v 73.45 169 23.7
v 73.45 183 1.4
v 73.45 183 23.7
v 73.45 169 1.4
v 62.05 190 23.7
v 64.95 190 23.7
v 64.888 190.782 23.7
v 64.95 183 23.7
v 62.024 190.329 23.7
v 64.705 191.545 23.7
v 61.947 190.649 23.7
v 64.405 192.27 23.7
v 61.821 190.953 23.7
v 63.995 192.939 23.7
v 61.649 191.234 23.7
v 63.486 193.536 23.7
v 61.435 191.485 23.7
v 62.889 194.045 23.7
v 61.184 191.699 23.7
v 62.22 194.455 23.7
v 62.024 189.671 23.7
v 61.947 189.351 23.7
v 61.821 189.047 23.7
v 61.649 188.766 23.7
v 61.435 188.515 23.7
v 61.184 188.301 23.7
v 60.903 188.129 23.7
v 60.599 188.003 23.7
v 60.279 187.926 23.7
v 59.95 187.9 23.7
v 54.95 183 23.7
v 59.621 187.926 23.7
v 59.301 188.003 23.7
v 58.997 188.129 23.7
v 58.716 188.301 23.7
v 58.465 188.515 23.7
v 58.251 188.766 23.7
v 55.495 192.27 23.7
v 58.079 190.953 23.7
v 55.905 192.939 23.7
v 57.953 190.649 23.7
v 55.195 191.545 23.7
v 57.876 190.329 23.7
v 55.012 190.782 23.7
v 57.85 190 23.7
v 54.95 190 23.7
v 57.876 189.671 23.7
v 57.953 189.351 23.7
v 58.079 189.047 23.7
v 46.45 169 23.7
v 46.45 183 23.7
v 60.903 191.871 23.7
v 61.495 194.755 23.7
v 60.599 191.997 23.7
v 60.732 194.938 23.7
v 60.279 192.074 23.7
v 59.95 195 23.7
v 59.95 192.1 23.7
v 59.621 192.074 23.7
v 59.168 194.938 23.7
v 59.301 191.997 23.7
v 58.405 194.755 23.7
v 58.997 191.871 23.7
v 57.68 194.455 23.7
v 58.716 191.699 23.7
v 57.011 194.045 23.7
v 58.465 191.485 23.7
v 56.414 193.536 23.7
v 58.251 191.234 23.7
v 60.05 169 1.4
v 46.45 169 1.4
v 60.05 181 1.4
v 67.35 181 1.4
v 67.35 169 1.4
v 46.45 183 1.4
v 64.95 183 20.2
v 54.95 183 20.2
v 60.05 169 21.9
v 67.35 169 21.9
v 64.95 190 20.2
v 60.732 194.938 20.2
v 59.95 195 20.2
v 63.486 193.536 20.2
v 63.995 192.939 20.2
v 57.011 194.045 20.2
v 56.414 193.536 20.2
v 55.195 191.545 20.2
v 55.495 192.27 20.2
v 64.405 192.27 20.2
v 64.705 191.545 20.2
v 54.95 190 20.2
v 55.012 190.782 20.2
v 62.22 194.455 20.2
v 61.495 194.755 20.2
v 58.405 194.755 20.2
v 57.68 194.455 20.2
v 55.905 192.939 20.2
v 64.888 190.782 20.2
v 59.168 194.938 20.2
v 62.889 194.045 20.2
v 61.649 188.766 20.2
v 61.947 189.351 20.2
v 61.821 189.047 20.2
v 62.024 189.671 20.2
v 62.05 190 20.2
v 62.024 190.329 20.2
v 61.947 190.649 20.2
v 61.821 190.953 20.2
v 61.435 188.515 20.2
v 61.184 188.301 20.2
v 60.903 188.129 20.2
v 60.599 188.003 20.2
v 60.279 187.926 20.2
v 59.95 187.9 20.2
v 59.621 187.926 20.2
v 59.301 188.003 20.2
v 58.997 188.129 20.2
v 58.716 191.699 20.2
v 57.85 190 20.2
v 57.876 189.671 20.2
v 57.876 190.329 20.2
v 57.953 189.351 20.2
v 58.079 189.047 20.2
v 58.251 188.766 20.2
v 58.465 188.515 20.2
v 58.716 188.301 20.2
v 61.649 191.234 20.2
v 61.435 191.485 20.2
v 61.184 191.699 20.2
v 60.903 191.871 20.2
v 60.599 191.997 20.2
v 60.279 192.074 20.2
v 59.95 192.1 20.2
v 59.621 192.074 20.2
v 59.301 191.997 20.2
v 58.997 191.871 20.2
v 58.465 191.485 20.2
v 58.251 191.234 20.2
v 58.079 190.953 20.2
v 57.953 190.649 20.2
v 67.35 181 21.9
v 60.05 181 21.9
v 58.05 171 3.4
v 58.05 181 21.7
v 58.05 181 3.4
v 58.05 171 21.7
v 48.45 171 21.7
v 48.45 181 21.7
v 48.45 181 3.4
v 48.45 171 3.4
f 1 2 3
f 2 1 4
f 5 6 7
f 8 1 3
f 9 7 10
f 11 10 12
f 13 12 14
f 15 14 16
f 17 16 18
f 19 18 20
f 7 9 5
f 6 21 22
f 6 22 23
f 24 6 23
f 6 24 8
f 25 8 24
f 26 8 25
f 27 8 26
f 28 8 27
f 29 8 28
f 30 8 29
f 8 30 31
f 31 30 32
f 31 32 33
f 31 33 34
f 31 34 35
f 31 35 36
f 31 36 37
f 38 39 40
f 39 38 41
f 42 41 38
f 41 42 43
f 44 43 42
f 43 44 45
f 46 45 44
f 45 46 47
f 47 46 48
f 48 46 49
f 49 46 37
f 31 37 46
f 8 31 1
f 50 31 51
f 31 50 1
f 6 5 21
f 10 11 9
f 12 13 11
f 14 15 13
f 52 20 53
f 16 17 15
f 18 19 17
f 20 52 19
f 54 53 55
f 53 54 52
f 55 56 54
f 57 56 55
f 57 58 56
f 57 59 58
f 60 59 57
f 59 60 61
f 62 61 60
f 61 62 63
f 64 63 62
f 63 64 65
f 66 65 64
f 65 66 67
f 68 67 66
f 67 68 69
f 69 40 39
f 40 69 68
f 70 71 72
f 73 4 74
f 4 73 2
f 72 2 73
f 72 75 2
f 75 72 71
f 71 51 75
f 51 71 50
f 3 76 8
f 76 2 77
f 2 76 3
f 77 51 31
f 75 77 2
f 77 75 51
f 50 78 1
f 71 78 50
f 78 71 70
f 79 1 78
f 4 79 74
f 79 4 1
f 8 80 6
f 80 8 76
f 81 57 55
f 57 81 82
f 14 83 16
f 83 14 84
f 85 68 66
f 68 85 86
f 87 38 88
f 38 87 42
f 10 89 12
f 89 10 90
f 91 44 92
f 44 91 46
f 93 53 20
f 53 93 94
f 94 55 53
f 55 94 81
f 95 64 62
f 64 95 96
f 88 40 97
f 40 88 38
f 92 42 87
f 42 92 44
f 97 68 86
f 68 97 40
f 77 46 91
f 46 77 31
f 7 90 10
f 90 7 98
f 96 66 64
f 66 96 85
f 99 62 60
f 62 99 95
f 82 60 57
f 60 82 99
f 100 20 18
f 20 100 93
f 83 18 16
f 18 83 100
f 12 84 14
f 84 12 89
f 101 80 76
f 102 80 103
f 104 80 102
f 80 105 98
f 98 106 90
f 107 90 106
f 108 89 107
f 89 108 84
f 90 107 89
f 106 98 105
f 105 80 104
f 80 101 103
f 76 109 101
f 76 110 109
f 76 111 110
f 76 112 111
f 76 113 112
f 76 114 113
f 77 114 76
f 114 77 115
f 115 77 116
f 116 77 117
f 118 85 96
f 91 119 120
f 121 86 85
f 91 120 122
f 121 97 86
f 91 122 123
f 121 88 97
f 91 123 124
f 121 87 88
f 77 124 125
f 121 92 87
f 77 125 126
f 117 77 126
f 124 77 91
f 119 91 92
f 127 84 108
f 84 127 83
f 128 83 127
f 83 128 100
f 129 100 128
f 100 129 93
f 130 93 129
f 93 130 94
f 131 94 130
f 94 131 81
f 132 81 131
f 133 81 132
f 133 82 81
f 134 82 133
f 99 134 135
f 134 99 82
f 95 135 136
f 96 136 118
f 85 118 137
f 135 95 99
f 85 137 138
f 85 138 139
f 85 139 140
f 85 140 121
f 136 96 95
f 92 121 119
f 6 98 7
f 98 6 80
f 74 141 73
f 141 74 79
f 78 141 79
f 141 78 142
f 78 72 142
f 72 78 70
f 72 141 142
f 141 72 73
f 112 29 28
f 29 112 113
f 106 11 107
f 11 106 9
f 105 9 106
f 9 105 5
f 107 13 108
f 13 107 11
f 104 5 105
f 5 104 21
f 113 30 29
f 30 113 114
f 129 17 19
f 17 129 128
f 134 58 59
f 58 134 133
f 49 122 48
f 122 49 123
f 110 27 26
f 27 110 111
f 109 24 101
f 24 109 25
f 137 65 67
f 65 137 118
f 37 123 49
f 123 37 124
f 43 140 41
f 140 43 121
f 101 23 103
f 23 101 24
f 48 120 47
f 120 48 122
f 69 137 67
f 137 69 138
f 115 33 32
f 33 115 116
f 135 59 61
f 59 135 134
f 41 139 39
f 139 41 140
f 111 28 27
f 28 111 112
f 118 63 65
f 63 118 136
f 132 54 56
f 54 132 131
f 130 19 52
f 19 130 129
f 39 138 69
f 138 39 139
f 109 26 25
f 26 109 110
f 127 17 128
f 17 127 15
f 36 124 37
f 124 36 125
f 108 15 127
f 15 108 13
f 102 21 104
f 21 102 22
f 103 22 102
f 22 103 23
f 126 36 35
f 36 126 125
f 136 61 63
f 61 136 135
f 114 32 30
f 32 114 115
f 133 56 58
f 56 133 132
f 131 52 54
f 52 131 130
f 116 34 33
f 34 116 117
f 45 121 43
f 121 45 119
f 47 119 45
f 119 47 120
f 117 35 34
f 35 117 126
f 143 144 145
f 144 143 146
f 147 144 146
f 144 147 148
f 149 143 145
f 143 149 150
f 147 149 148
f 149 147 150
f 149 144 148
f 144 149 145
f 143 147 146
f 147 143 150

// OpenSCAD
// file: common.scad
// Pi Flux r1 - reverse-engineered shared parameters
// Coordinates: x = left->right as seen from the FRONT, y = top->bottom
// (top edge = pull-switch side), z = 0 at the back surface, up towards the screen.
// Use at(x,y) to place things in these "drawing" coordinates.

$fn = 40;

// ---------------- overall ----------------
W        = 150;     // outer width
L        = 183;     // outer height
CH       = 9;       // corner chamfer
WALL     = 3;       // side wall thickness
FLOOR    = 2;       // back plate thickness
H_BOT    = 24;      // bottom shell height (split plane)
H_FACE   = 10.5;    // face part height
T        = H_BOT + H_FACE; // total thickness
PLATE    = 2;       // face plate thickness
TOL      = 0.25;

// ---------------- screws ----------------
M25_CLR  = 2.8;     // clearance hole
M25_PIL  = 2.2;     // pilot hole for self tapping into plastic (use 3.6 for brass insert)
M25_HEAD = 5.2;     // counterbore for head
BOSS_D   = 7;
// 6 case screws: 4 corners + 2 on the screen/keyboard divider
CASE_SCREWS = [[8.5,8.5],[W-8.5,8.5],[6.5,90],[W-6.5,90],[8.5,L-8.5],[W-8.5,L-8.5]];

// ---------------- display (Waveshare 5-DSI-TOUCH-A) ----------------
DISP_W = 129; DISP_H = 72.8; DISP_T = 7.8; DISP_R = 4; DISP_POST = 5;
DISP_X = (W-DISP_W)/2;  // left edge of glass
DISP_Y = 13;            // top edge of glass
DISP_Z_FRONT = T - PLATE;
DISP_Z_BACK  = DISP_Z_FRONT - DISP_T;
DISP_POST_END = DISP_Z_BACK - DISP_POST;   // where the display's own standoffs end
// outer 117 x 61 M2.5 pattern (6 / 5.9 mm from glass edges)
DISP_HOLES = [for (dx=[6, 6+117]) for (dy=[5.9, 5.9+61]) [DISP_X+dx, DISP_Y+dy]];

// ---------------- Raspberry Pi 5 (mounted on the display back) -----
// inner 58 x 49 pattern; ports point to the RIGHT wall, USB-C edge to the TOP
PI_HOLES_X = [DISP_X+45.5, DISP_X+45.5+58];
PI_HOLES_Y = [DISP_Y+11.9, DISP_Y+11.9+49];
PI_X0 = PI_HOLES_X[0]-3.5;          // non-port end of the board
PI_Y0 = PI_HOLES_Y[0]-3.5;          // USB-C / HDMI edge
PI_PCB_TOP = DISP_POST_END;         // pcb face against the posts
PI_PCB_BOT = PI_PCB_TOP - 1.6;      // component side faces the back plate
PI_USBC_X  = PI_X0 + 11.2;
PI_USBC_Z  = PI_PCB_BOT - 1.6;
// right-edge ports (centre measured from the USB-C edge, width, height)
PI_PORTS = [[10.2, 16.0, 13.6], [29.1, 13.4, 16.0], [47.0, 13.4, 16.0]];

// ---------------- battery (INIU 10000 mAh) ----------------
BAT_W = 112; BAT_H = 70; BAT_T = 16;      // measure yours!
BAT_X = (W-BAT_W)/2;
BAT_Y = L - WALL - 5.5 - BAT_H;            // leaves room for the button plunger
BTN_X = 108;                                // battery button position along the bottom edge
BTN_Z = FLOOR + BAT_T/2;
BTN_W = 6; BTN_HH = 4;                      // button plunger cross-section

// ---------------- pull switch (USB-C U adapter) ----------------
PULL_SLOT_X0 = 46.2; PULL_SLOT_W = 27.5;    // from the mat drawing (46.2 | 27.5 | 66.2)
PULL_GROOVE = 0.8;                          // floor groove the carrier rides in
// USB-C U (180 deg) adapter, standing upright: male plug on top (into the Pi),
// female socket below (battery cable, runs under the Pi / through the cooler fins)
UADP = [7.0, 12.5, 20.5];                   // body thickness(x), depth(y, excl. plug), height(z) - measure yours!
UADP_MALE_FROM_TOP = 5.25;                  // body top -> male plug centre
UADP_PLUG = 6.5;                            // male plug length
PULL_TRAVEL = 7;

// ---------------- keyboard ----------------
KB_WIN = [10, 97, 140, 164];                // x0,y0,x1,y1 of key window in face plate
KB_PCB = [137, 72];                         // keyboard PCB outline
KB_PCB_X = (W-KB_PCB[0])/2; KB_PCB_Y = 94.5;
KB_PCB_FRONT = T - 5;                       // z of the PCB front face
KB_PCB_BACK  = KB_PCB_FRONT - 1.2;

// ---------------- helpers ----------------
module at(x, y, z=0) translate([x, L-y, z]) children();

// base chamfered rectangle (in real XY, origin bottom-left)
module chamfer_rect(w, l, c) {
    polygon([[c,0],[w-c,0],[w,c],[w,l-c],[w-c,l],[c,l],[0,l-c],[0,c]]);
}

// ---------------- rugged exterior ----------------
// The body edges carry a large 45 deg chamfer (front and back), so the full-height corner
// bumpers stand proud in every view. The grip sides carry vertical ribs. All of it is
// printable without supports: the chamfers are 45 deg overhangs, the ribs are vertical.
EDGE_CZ = 3;        // edge chamfer (front + back), measured from the rib tips
BUMP    = 3;        // corner bumper protrusion beyond the body
BUMP_LX = 26;       // bumper length along the top/bottom edges (from the corner)
BUMP_LY = 21;       // ... along the sides (the first Pi port window starts at y=23)
BUMP_CZ = 1.2;      // small chamfer on the bumpers
RIB_H = 1.2; RIB_W = 1.6; RIB_P = 4;   // grip ribs: height, width, pitch
// grip rib zones: [side (0 = left, 1 = right), y0, y1] in drawing coords
RIB_ZONES = [[0, 54, 160], [1, 82, 160]];

module body2d() offset(r=1) offset(delta=-1) chamfer_rect(W, L, CH);

module ribs2d() {
    for (z = RIB_ZONES) for (y = [z[1] : RIB_P : z[2] - RIB_W]) {
        translate([z[0] ? W : 0, L - y - RIB_W]) mirror([z[0] ? 0 : 1, 0])
            polygon([[-0.5, 0], [RIB_H - 0.4, 0], [RIB_H, 0.4], [RIB_H, RIB_W - 0.4], [RIB_H - 0.4, RIB_W], [-0.5, RIB_W]]);
    }
}

// one bumper per corner; 45 deg tapered ends where it meets the body
module bumper2d() {
    win = [[-20, -20], [BUMP_LX - 20, -20], [BUMP_LX + 1, 1], [1, BUMP_LY + 1], [-20, BUMP_LY - 20]];
    intersection() {
        offset(r=1) offset(delta=-1) offset(delta=BUMP) chamfer_rect(W, L, CH);
        for (mx = [0, 1]) for (my = [0, 1])
            translate([mx * W, my * L]) mirror([mx, 0]) mirror([0, my]) polygon(win);
    }
}

// convex chamfered slab around the chamfer_rect body, grown by d
module chamfer_slab(d, c, h=T) hull() {
    linear_extrude(0.01) offset(delta=d - c) chamfer_rect(W, L, CH);
    translate([0, 0, c]) linear_extrude(h - 2 * c) offset(delta=d) chamfer_rect(W, L, CH);
    translate([0, 0, h - 0.01]) linear_extrude(0.01) offset(delta=d - c) chamfer_rect(W, L, CH);
}

// complete closed outer body, z = 0 .. T (each part intersects its own z range)
module outer_body() {
    intersection() {
        linear_extrude(T) { body2d(); ribs2d(); }
        chamfer_slab(RIB_H, EDGE_CZ);
    }
    intersection() {
        linear_extrude(T) bumper2d();
        chamfer_slab(BUMP, BUMP_CZ);
    }
}
module inner_outline() offset(delta=-WALL) offset(r=1) offset(delta=-1) chamfer_rect(W, L, CH);

module rrect(w, h, r) offset(r=r) offset(delta=-r) square([w, h]);
// main file
// Pi Flux r1 - Internal top pull switch (Pi power)
// Holds a USB-C 180deg "U" adapter upright: the male plug goes into the Pi 5 USB-C,
// the battery cable plugs into the female socket below it. Pull the key ring to
// unplug the adapter (= Pi off), push back in to power on.
// Modelled in assembly position; export lays it on its side.
include <common.scad>

PS_X0 = PULL_SLOT_X0 + TOL; PS_X1 = PULL_SLOT_X0 + PULL_SLOT_W - TOL;
PS_Z0 = FLOOR - PULL_GROOVE + 0.2;
PS_Z1 = H_BOT - 0.3;
PS_D  = 1.5 + UADP[1];               // carrier depth (y)
UMALE_TOP = PI_USBC_Z + UADP_MALE_FROM_TOP;

module pull_switch() {
    difference() {
        union() {
            // carrier block
            at(PS_X0, 0, PS_Z0) translate([0,-PS_D,0]) cube([PS_X1-PS_X0, PS_D, PS_Z1-PS_Z0]);
            // ring tab sticking out of the top edge
            at((PS_X0+PS_X1)/2, 0, PS_Z1 - 3.5) hull() {   // flush with the top so it prints upside-down without supports
                translate([-5, -1, 0]) cube([10, 1, 3.5]);
                translate([0, 7, 0]) cylinder(d=10, h=3.5);   // +real y = outside the top edge
            }
        }
        // adapter pocket, open towards the Pi (+y) and at the bottom
        at(PI_USBC_X - (UADP[0]+0.3)/2, 1.5, PS_Z0 - 1)
            translate([0, -(PS_D), 0]) cube([UADP[0]+0.3, PS_D - 1.5 + 1, UMALE_TOP + 0.15 - PS_Z0 + 1]);
        // ring hole
        at((PS_X0+PS_X1)/2, -7, PS_Z1 - 5) cylinder(d=4.2, h=6);
        // lighten the left part of the block, keep a 2 mm skin
        at(PS_X0 + 2, 2, PS_Z0 + 2) translate([0,-(PS_D-4),0]) cube([PI_USBC_X - (UADP[0]+0.3)/2 - PS_X0 - 4, PS_D-4, PS_Z1-PS_Z0-4]);
    }
}
if (is_undef(ASSEMBLY)) pull_switch();
